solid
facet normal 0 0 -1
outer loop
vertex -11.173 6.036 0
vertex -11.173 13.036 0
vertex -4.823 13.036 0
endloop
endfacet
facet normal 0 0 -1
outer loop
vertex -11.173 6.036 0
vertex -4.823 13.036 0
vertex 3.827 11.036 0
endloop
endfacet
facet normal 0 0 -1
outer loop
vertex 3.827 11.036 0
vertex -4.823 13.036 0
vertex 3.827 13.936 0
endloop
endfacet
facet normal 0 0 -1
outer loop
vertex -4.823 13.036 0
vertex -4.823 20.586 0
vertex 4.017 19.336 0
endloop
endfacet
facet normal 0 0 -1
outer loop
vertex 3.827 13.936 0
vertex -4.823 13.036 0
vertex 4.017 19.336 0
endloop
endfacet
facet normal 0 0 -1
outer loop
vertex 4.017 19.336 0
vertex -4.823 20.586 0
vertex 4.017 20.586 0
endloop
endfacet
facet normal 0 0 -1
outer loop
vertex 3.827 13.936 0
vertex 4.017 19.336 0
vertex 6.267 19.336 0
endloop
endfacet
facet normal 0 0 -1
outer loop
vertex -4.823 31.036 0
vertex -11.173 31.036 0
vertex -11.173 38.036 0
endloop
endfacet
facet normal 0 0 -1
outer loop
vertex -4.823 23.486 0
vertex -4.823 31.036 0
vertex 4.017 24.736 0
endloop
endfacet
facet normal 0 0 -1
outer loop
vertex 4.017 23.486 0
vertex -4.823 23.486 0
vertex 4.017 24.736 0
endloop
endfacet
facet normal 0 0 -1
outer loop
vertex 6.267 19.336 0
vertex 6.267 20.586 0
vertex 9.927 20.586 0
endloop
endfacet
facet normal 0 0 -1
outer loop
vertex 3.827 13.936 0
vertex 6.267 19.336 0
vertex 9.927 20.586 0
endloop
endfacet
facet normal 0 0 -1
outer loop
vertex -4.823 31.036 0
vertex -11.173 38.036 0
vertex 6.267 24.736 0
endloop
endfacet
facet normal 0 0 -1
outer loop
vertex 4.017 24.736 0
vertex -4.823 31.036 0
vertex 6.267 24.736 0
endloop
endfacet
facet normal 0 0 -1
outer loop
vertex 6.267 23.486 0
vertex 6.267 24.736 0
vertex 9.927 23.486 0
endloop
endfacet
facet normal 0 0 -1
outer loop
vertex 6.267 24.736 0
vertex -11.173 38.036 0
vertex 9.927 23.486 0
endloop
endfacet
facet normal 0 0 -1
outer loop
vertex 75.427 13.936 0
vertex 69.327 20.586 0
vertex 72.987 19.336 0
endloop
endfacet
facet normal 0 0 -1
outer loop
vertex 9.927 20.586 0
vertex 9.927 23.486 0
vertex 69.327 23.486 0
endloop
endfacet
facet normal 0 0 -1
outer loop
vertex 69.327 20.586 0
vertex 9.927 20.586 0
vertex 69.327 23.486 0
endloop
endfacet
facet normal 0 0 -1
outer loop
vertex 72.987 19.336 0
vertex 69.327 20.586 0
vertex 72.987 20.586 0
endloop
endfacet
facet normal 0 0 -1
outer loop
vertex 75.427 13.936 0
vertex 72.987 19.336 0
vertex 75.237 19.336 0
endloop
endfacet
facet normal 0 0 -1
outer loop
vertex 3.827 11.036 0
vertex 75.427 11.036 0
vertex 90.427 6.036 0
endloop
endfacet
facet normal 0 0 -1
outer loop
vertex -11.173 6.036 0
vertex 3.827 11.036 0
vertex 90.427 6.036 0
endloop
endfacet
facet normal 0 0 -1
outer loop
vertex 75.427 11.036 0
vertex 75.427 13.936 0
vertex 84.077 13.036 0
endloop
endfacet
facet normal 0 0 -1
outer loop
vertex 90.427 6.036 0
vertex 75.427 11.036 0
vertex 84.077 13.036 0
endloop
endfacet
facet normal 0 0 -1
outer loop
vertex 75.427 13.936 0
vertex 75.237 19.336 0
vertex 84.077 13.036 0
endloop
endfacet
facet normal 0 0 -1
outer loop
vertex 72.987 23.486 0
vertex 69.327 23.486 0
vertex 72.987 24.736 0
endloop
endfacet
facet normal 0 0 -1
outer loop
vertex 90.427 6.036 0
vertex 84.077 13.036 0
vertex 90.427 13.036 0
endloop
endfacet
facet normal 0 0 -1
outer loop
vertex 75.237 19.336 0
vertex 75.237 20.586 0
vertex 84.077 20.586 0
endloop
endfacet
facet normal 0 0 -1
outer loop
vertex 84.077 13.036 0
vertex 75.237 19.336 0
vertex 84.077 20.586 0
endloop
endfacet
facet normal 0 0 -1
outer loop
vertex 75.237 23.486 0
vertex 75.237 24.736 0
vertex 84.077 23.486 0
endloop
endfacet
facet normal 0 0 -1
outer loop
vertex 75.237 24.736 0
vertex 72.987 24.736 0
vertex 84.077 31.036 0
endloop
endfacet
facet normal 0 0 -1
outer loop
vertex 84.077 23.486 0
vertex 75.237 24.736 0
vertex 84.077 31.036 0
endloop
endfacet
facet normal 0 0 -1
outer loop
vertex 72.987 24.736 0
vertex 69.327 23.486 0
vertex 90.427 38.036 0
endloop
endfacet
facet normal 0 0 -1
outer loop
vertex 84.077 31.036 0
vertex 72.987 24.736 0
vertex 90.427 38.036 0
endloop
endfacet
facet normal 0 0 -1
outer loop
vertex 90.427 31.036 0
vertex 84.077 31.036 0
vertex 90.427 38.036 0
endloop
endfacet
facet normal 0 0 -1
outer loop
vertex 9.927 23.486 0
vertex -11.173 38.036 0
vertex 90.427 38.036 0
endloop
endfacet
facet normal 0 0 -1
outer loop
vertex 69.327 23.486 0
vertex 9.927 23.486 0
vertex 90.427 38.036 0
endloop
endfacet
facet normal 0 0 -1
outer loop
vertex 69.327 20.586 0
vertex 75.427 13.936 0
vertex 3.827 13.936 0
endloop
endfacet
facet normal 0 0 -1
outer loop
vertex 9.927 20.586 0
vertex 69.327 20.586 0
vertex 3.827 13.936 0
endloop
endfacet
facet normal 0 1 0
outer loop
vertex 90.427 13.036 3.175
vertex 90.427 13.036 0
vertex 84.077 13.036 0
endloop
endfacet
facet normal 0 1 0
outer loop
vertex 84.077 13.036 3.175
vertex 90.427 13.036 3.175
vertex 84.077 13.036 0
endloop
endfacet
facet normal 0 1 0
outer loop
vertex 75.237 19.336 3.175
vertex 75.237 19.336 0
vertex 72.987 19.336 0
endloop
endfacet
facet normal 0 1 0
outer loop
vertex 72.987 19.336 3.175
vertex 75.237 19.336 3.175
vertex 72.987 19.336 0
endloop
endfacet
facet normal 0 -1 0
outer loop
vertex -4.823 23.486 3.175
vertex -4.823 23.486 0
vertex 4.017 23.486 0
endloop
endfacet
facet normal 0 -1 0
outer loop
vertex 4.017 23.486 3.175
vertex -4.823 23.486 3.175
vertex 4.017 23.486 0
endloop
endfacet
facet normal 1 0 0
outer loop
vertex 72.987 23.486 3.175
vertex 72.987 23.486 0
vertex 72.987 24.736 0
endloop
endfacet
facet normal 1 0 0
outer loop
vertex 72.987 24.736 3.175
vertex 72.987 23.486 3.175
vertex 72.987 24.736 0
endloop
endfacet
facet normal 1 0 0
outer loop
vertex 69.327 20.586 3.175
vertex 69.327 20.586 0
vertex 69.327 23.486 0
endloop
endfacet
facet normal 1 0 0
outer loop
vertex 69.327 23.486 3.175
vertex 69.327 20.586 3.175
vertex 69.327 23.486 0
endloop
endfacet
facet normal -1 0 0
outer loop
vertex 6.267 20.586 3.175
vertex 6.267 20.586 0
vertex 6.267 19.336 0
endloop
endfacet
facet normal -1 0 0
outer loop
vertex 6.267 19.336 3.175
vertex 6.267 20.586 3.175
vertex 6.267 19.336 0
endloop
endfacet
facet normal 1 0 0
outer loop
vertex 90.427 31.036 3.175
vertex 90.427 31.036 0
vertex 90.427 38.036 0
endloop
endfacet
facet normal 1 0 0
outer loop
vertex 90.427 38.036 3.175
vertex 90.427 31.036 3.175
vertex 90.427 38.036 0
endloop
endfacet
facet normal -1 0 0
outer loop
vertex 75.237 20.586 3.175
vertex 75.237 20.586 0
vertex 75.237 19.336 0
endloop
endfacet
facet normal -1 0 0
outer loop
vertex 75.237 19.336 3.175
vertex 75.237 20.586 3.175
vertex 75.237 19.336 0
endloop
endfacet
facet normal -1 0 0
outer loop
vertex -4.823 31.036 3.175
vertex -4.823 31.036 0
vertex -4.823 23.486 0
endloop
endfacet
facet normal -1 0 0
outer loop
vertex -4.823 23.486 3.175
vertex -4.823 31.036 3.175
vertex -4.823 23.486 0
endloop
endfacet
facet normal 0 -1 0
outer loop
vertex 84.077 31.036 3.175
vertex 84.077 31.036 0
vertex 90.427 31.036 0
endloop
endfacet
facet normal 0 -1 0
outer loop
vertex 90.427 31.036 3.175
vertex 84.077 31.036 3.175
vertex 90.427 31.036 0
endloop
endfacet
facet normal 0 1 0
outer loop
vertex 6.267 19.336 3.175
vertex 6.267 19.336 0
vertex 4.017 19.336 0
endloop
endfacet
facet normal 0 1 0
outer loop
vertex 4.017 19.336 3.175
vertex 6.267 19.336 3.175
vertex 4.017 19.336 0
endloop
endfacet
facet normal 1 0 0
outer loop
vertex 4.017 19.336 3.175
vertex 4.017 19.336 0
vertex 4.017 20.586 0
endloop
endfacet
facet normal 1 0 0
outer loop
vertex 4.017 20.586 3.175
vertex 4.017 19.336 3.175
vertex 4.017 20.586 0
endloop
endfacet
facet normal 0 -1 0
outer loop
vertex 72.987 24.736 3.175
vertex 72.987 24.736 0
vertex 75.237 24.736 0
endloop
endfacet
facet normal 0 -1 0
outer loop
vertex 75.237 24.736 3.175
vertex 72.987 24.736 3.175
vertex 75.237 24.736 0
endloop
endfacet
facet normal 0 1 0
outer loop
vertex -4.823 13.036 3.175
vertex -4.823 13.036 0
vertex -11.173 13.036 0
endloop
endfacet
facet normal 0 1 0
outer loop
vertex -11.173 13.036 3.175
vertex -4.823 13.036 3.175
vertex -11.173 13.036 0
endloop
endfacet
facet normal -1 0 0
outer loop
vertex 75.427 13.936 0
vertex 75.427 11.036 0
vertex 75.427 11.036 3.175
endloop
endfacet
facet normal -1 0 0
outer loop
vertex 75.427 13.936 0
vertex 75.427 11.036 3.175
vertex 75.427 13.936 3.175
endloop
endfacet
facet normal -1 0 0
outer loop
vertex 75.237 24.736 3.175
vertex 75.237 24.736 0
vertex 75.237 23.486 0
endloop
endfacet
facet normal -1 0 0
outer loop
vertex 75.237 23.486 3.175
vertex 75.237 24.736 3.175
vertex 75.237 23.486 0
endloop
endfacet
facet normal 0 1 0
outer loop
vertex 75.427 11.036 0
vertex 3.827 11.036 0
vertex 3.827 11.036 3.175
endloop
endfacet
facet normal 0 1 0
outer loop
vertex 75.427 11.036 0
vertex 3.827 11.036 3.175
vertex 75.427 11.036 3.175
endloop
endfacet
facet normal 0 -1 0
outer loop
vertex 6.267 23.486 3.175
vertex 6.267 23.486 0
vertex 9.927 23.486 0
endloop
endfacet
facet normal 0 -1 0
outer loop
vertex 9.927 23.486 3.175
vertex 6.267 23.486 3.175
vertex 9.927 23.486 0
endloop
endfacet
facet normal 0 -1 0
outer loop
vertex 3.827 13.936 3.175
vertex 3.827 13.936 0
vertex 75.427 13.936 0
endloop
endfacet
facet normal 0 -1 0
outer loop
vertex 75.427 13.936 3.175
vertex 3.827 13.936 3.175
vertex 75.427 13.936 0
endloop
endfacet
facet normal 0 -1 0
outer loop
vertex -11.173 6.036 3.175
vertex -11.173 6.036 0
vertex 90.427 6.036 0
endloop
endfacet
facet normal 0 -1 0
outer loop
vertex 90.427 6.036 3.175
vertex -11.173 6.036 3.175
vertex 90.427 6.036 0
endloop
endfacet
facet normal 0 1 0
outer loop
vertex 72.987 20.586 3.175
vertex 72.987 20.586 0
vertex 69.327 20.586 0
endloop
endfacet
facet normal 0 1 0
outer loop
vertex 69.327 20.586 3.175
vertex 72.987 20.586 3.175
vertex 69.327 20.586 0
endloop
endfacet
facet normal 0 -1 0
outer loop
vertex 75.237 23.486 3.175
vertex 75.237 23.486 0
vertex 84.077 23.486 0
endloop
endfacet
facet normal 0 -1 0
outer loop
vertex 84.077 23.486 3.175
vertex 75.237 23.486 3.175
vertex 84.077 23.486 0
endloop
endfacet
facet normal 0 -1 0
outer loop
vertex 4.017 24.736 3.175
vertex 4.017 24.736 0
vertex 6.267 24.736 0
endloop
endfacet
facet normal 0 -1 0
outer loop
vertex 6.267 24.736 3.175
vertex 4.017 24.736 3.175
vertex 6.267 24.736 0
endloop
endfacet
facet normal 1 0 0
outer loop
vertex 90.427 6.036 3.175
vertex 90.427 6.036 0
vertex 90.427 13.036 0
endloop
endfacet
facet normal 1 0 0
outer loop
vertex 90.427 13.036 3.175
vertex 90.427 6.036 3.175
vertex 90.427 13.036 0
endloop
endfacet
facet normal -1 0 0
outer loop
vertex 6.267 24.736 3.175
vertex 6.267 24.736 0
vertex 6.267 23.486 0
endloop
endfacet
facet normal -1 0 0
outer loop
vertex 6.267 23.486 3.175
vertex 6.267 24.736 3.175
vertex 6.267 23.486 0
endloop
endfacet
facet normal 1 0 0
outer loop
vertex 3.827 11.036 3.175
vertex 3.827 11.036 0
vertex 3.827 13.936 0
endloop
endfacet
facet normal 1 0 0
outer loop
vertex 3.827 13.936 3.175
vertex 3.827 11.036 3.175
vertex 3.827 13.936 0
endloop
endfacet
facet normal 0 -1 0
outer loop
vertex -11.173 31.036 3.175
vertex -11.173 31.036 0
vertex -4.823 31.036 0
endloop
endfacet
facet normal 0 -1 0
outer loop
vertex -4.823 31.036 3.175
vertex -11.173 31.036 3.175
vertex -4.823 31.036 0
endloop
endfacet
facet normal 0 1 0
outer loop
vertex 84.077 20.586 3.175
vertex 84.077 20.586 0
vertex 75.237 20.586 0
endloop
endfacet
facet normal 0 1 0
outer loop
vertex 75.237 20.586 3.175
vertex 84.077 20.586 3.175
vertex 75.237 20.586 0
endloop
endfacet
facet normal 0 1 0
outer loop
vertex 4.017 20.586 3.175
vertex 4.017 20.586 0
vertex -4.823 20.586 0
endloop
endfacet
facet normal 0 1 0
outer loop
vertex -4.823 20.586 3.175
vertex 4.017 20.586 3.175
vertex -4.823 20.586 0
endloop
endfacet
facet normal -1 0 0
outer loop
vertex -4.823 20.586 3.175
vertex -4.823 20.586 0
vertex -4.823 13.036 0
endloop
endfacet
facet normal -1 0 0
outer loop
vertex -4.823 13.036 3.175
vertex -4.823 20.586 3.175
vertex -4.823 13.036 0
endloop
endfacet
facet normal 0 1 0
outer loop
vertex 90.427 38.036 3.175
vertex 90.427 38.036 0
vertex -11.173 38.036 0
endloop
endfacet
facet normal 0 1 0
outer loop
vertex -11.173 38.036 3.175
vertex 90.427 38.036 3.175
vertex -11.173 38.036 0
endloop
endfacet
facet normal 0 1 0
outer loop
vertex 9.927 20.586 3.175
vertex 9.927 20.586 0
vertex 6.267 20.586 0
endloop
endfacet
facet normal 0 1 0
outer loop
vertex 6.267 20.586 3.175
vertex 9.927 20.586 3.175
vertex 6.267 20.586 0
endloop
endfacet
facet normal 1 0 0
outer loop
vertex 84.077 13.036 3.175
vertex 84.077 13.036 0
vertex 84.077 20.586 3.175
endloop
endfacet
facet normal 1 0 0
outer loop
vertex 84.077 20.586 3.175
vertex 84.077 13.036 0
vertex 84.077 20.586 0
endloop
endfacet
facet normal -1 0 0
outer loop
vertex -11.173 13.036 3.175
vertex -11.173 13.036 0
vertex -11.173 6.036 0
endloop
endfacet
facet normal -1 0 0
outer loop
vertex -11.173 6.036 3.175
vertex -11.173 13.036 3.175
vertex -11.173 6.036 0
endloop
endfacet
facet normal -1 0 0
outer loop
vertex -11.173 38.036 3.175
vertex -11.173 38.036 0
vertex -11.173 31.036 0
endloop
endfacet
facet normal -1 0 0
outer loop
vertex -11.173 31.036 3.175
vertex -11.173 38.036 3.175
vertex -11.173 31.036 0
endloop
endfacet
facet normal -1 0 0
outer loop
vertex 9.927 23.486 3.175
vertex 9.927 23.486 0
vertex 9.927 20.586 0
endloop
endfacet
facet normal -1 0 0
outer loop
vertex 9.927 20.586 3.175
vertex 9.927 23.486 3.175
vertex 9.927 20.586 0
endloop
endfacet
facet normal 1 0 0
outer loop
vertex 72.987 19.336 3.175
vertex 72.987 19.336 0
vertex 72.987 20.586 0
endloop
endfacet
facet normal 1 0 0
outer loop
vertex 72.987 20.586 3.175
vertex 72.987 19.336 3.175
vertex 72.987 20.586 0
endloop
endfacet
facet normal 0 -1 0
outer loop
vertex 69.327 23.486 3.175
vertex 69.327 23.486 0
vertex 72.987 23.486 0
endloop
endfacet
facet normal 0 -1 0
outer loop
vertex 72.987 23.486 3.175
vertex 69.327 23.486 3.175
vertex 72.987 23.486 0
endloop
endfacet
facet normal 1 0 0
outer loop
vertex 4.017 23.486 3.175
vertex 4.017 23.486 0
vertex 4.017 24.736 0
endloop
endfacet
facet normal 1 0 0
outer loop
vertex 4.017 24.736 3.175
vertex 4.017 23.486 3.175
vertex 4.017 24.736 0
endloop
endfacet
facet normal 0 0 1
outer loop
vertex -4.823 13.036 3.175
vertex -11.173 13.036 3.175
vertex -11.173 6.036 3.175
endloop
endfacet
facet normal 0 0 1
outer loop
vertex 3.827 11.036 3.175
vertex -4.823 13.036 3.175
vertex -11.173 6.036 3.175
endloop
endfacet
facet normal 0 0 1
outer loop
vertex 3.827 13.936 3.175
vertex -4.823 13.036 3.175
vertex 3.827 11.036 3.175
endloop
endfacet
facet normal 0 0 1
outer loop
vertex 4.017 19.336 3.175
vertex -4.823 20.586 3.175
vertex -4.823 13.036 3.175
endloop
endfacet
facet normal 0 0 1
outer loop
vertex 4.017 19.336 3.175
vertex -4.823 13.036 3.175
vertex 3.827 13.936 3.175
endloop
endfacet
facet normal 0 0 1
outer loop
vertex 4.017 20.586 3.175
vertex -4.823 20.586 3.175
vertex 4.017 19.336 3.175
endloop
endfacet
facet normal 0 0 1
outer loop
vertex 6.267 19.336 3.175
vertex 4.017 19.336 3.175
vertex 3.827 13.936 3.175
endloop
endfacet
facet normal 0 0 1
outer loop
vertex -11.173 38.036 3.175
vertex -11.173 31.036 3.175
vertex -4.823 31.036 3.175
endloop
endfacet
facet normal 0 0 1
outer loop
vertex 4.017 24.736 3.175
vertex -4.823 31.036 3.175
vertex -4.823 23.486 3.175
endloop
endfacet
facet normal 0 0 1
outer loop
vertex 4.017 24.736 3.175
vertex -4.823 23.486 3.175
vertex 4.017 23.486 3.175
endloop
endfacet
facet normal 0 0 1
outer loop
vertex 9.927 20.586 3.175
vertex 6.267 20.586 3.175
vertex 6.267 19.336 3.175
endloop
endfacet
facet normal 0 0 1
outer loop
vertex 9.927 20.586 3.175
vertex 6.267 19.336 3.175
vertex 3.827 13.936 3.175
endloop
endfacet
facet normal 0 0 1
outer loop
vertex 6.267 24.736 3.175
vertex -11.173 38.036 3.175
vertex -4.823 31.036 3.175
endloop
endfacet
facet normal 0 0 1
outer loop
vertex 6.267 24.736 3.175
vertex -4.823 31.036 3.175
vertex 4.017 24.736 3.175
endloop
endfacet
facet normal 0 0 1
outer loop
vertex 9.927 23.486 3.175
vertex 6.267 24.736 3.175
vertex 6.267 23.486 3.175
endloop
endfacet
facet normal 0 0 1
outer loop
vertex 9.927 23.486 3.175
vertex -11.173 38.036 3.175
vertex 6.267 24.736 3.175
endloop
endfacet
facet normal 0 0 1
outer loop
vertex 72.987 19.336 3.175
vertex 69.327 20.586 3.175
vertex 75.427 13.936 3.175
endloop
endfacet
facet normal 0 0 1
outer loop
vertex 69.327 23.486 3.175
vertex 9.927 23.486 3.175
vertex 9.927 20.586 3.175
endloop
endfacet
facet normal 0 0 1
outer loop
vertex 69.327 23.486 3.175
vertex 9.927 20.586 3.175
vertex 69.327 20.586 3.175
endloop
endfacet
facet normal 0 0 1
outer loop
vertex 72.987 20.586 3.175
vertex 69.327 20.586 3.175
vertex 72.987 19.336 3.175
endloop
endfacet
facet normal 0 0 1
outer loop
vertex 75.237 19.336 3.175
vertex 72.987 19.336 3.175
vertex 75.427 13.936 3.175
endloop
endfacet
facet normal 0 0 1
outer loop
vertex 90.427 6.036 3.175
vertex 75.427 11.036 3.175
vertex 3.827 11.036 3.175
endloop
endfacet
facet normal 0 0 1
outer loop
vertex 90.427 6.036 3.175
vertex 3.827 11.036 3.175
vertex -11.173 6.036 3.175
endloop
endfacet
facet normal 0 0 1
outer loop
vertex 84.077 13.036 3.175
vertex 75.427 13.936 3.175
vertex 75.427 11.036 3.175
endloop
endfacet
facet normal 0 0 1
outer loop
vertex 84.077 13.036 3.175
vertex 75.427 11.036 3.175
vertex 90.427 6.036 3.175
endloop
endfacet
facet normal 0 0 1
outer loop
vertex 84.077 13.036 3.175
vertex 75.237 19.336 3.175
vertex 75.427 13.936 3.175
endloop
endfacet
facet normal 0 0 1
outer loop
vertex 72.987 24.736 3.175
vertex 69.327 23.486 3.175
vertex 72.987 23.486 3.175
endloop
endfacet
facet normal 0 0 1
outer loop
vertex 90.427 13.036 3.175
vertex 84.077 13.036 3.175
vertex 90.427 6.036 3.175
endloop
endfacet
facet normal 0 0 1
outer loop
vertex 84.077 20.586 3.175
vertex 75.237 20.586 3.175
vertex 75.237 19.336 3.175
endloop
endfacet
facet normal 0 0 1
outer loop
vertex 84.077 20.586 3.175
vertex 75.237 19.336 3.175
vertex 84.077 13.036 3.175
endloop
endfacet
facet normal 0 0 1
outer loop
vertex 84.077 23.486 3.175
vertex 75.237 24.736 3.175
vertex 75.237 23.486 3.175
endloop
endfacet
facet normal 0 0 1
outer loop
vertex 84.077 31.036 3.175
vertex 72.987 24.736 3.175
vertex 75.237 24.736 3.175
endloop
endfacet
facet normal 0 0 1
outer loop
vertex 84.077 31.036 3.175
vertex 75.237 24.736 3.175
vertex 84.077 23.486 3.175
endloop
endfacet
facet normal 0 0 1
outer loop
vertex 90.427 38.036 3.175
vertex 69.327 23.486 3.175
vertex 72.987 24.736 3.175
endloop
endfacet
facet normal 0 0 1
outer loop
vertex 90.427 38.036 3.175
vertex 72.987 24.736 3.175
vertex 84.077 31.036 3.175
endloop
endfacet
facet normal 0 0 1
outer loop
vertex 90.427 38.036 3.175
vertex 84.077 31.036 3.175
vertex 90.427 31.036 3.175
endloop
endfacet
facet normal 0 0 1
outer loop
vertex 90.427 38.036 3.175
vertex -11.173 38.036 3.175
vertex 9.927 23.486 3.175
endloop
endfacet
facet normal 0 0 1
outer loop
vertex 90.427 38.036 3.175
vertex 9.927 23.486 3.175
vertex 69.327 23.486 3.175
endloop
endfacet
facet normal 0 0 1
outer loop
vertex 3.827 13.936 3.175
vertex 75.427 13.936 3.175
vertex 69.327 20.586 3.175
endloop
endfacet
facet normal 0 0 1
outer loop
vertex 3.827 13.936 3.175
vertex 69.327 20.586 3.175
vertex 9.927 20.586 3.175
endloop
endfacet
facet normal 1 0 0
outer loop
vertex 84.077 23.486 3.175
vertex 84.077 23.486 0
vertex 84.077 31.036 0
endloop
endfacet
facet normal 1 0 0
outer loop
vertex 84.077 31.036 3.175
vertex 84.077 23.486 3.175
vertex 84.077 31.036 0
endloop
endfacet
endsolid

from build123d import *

# Parameters (mm, degrees)
SKETCH1_W      = 71.6
SKETCH1_H      = 2.9
EXTRUDE1_DEPTH = 3.175


with BuildPart() as part:
    # Sketch1 → Extrude1 (new body)
    with BuildSketch(Plane.XY):
        Polygon((90.427144536, 6.036016451), (90.427144536, 13.036016451), (84.077144536, 13.036016451), (84.077144536, 20.586016451), (75.237144536, 20.586016451), (75.237144536, 19.336016451), (72.987144536, 19.336016451), (72.987144536, 20.586016451), (69.327144536, 20.586016451), (69.327144536, 23.486016451), (72.987144536, 23.486016451), (72.987144536, 24.736016451), (75.237144536, 24.736016451), (75.237144536, 23.486016451), (84.077144536, 23.486016451), (84.077144536, 31.036016451), (90.427144536, 31.036016451), (90.427144536, 38.036016451), (-11.172855464, 38.036016451), (-11.172855464, 31.036016451), (-4.822855464, 31.036016451), (-4.822855464, 23.486016451), (4.017144536, 23.486016451), (4.017144536, 24.736016451), (6.267144536, 24.736016451), (6.267144536, 23.486016451), (9.927144536, 23.486016451), (9.927144536, 20.586016451), (6.267144536, 20.586016451), (6.267144536, 19.336016451), (4.017144536, 19.336016451), (4.017144536, 20.586016451), (-4.822855464, 20.586016451), (-4.822855464, 13.036016451), (-11.172855464, 13.036016451), (-11.172855464, 6.036016451), align=None)
        with Locations((39.627144536, 12.486016451)):
            Rectangle(SKETCH1_W, SKETCH1_H, mode=Mode.SUBTRACT)
    extrude(amount=EXTRUDE1_DEPTH)


solid = part.part
